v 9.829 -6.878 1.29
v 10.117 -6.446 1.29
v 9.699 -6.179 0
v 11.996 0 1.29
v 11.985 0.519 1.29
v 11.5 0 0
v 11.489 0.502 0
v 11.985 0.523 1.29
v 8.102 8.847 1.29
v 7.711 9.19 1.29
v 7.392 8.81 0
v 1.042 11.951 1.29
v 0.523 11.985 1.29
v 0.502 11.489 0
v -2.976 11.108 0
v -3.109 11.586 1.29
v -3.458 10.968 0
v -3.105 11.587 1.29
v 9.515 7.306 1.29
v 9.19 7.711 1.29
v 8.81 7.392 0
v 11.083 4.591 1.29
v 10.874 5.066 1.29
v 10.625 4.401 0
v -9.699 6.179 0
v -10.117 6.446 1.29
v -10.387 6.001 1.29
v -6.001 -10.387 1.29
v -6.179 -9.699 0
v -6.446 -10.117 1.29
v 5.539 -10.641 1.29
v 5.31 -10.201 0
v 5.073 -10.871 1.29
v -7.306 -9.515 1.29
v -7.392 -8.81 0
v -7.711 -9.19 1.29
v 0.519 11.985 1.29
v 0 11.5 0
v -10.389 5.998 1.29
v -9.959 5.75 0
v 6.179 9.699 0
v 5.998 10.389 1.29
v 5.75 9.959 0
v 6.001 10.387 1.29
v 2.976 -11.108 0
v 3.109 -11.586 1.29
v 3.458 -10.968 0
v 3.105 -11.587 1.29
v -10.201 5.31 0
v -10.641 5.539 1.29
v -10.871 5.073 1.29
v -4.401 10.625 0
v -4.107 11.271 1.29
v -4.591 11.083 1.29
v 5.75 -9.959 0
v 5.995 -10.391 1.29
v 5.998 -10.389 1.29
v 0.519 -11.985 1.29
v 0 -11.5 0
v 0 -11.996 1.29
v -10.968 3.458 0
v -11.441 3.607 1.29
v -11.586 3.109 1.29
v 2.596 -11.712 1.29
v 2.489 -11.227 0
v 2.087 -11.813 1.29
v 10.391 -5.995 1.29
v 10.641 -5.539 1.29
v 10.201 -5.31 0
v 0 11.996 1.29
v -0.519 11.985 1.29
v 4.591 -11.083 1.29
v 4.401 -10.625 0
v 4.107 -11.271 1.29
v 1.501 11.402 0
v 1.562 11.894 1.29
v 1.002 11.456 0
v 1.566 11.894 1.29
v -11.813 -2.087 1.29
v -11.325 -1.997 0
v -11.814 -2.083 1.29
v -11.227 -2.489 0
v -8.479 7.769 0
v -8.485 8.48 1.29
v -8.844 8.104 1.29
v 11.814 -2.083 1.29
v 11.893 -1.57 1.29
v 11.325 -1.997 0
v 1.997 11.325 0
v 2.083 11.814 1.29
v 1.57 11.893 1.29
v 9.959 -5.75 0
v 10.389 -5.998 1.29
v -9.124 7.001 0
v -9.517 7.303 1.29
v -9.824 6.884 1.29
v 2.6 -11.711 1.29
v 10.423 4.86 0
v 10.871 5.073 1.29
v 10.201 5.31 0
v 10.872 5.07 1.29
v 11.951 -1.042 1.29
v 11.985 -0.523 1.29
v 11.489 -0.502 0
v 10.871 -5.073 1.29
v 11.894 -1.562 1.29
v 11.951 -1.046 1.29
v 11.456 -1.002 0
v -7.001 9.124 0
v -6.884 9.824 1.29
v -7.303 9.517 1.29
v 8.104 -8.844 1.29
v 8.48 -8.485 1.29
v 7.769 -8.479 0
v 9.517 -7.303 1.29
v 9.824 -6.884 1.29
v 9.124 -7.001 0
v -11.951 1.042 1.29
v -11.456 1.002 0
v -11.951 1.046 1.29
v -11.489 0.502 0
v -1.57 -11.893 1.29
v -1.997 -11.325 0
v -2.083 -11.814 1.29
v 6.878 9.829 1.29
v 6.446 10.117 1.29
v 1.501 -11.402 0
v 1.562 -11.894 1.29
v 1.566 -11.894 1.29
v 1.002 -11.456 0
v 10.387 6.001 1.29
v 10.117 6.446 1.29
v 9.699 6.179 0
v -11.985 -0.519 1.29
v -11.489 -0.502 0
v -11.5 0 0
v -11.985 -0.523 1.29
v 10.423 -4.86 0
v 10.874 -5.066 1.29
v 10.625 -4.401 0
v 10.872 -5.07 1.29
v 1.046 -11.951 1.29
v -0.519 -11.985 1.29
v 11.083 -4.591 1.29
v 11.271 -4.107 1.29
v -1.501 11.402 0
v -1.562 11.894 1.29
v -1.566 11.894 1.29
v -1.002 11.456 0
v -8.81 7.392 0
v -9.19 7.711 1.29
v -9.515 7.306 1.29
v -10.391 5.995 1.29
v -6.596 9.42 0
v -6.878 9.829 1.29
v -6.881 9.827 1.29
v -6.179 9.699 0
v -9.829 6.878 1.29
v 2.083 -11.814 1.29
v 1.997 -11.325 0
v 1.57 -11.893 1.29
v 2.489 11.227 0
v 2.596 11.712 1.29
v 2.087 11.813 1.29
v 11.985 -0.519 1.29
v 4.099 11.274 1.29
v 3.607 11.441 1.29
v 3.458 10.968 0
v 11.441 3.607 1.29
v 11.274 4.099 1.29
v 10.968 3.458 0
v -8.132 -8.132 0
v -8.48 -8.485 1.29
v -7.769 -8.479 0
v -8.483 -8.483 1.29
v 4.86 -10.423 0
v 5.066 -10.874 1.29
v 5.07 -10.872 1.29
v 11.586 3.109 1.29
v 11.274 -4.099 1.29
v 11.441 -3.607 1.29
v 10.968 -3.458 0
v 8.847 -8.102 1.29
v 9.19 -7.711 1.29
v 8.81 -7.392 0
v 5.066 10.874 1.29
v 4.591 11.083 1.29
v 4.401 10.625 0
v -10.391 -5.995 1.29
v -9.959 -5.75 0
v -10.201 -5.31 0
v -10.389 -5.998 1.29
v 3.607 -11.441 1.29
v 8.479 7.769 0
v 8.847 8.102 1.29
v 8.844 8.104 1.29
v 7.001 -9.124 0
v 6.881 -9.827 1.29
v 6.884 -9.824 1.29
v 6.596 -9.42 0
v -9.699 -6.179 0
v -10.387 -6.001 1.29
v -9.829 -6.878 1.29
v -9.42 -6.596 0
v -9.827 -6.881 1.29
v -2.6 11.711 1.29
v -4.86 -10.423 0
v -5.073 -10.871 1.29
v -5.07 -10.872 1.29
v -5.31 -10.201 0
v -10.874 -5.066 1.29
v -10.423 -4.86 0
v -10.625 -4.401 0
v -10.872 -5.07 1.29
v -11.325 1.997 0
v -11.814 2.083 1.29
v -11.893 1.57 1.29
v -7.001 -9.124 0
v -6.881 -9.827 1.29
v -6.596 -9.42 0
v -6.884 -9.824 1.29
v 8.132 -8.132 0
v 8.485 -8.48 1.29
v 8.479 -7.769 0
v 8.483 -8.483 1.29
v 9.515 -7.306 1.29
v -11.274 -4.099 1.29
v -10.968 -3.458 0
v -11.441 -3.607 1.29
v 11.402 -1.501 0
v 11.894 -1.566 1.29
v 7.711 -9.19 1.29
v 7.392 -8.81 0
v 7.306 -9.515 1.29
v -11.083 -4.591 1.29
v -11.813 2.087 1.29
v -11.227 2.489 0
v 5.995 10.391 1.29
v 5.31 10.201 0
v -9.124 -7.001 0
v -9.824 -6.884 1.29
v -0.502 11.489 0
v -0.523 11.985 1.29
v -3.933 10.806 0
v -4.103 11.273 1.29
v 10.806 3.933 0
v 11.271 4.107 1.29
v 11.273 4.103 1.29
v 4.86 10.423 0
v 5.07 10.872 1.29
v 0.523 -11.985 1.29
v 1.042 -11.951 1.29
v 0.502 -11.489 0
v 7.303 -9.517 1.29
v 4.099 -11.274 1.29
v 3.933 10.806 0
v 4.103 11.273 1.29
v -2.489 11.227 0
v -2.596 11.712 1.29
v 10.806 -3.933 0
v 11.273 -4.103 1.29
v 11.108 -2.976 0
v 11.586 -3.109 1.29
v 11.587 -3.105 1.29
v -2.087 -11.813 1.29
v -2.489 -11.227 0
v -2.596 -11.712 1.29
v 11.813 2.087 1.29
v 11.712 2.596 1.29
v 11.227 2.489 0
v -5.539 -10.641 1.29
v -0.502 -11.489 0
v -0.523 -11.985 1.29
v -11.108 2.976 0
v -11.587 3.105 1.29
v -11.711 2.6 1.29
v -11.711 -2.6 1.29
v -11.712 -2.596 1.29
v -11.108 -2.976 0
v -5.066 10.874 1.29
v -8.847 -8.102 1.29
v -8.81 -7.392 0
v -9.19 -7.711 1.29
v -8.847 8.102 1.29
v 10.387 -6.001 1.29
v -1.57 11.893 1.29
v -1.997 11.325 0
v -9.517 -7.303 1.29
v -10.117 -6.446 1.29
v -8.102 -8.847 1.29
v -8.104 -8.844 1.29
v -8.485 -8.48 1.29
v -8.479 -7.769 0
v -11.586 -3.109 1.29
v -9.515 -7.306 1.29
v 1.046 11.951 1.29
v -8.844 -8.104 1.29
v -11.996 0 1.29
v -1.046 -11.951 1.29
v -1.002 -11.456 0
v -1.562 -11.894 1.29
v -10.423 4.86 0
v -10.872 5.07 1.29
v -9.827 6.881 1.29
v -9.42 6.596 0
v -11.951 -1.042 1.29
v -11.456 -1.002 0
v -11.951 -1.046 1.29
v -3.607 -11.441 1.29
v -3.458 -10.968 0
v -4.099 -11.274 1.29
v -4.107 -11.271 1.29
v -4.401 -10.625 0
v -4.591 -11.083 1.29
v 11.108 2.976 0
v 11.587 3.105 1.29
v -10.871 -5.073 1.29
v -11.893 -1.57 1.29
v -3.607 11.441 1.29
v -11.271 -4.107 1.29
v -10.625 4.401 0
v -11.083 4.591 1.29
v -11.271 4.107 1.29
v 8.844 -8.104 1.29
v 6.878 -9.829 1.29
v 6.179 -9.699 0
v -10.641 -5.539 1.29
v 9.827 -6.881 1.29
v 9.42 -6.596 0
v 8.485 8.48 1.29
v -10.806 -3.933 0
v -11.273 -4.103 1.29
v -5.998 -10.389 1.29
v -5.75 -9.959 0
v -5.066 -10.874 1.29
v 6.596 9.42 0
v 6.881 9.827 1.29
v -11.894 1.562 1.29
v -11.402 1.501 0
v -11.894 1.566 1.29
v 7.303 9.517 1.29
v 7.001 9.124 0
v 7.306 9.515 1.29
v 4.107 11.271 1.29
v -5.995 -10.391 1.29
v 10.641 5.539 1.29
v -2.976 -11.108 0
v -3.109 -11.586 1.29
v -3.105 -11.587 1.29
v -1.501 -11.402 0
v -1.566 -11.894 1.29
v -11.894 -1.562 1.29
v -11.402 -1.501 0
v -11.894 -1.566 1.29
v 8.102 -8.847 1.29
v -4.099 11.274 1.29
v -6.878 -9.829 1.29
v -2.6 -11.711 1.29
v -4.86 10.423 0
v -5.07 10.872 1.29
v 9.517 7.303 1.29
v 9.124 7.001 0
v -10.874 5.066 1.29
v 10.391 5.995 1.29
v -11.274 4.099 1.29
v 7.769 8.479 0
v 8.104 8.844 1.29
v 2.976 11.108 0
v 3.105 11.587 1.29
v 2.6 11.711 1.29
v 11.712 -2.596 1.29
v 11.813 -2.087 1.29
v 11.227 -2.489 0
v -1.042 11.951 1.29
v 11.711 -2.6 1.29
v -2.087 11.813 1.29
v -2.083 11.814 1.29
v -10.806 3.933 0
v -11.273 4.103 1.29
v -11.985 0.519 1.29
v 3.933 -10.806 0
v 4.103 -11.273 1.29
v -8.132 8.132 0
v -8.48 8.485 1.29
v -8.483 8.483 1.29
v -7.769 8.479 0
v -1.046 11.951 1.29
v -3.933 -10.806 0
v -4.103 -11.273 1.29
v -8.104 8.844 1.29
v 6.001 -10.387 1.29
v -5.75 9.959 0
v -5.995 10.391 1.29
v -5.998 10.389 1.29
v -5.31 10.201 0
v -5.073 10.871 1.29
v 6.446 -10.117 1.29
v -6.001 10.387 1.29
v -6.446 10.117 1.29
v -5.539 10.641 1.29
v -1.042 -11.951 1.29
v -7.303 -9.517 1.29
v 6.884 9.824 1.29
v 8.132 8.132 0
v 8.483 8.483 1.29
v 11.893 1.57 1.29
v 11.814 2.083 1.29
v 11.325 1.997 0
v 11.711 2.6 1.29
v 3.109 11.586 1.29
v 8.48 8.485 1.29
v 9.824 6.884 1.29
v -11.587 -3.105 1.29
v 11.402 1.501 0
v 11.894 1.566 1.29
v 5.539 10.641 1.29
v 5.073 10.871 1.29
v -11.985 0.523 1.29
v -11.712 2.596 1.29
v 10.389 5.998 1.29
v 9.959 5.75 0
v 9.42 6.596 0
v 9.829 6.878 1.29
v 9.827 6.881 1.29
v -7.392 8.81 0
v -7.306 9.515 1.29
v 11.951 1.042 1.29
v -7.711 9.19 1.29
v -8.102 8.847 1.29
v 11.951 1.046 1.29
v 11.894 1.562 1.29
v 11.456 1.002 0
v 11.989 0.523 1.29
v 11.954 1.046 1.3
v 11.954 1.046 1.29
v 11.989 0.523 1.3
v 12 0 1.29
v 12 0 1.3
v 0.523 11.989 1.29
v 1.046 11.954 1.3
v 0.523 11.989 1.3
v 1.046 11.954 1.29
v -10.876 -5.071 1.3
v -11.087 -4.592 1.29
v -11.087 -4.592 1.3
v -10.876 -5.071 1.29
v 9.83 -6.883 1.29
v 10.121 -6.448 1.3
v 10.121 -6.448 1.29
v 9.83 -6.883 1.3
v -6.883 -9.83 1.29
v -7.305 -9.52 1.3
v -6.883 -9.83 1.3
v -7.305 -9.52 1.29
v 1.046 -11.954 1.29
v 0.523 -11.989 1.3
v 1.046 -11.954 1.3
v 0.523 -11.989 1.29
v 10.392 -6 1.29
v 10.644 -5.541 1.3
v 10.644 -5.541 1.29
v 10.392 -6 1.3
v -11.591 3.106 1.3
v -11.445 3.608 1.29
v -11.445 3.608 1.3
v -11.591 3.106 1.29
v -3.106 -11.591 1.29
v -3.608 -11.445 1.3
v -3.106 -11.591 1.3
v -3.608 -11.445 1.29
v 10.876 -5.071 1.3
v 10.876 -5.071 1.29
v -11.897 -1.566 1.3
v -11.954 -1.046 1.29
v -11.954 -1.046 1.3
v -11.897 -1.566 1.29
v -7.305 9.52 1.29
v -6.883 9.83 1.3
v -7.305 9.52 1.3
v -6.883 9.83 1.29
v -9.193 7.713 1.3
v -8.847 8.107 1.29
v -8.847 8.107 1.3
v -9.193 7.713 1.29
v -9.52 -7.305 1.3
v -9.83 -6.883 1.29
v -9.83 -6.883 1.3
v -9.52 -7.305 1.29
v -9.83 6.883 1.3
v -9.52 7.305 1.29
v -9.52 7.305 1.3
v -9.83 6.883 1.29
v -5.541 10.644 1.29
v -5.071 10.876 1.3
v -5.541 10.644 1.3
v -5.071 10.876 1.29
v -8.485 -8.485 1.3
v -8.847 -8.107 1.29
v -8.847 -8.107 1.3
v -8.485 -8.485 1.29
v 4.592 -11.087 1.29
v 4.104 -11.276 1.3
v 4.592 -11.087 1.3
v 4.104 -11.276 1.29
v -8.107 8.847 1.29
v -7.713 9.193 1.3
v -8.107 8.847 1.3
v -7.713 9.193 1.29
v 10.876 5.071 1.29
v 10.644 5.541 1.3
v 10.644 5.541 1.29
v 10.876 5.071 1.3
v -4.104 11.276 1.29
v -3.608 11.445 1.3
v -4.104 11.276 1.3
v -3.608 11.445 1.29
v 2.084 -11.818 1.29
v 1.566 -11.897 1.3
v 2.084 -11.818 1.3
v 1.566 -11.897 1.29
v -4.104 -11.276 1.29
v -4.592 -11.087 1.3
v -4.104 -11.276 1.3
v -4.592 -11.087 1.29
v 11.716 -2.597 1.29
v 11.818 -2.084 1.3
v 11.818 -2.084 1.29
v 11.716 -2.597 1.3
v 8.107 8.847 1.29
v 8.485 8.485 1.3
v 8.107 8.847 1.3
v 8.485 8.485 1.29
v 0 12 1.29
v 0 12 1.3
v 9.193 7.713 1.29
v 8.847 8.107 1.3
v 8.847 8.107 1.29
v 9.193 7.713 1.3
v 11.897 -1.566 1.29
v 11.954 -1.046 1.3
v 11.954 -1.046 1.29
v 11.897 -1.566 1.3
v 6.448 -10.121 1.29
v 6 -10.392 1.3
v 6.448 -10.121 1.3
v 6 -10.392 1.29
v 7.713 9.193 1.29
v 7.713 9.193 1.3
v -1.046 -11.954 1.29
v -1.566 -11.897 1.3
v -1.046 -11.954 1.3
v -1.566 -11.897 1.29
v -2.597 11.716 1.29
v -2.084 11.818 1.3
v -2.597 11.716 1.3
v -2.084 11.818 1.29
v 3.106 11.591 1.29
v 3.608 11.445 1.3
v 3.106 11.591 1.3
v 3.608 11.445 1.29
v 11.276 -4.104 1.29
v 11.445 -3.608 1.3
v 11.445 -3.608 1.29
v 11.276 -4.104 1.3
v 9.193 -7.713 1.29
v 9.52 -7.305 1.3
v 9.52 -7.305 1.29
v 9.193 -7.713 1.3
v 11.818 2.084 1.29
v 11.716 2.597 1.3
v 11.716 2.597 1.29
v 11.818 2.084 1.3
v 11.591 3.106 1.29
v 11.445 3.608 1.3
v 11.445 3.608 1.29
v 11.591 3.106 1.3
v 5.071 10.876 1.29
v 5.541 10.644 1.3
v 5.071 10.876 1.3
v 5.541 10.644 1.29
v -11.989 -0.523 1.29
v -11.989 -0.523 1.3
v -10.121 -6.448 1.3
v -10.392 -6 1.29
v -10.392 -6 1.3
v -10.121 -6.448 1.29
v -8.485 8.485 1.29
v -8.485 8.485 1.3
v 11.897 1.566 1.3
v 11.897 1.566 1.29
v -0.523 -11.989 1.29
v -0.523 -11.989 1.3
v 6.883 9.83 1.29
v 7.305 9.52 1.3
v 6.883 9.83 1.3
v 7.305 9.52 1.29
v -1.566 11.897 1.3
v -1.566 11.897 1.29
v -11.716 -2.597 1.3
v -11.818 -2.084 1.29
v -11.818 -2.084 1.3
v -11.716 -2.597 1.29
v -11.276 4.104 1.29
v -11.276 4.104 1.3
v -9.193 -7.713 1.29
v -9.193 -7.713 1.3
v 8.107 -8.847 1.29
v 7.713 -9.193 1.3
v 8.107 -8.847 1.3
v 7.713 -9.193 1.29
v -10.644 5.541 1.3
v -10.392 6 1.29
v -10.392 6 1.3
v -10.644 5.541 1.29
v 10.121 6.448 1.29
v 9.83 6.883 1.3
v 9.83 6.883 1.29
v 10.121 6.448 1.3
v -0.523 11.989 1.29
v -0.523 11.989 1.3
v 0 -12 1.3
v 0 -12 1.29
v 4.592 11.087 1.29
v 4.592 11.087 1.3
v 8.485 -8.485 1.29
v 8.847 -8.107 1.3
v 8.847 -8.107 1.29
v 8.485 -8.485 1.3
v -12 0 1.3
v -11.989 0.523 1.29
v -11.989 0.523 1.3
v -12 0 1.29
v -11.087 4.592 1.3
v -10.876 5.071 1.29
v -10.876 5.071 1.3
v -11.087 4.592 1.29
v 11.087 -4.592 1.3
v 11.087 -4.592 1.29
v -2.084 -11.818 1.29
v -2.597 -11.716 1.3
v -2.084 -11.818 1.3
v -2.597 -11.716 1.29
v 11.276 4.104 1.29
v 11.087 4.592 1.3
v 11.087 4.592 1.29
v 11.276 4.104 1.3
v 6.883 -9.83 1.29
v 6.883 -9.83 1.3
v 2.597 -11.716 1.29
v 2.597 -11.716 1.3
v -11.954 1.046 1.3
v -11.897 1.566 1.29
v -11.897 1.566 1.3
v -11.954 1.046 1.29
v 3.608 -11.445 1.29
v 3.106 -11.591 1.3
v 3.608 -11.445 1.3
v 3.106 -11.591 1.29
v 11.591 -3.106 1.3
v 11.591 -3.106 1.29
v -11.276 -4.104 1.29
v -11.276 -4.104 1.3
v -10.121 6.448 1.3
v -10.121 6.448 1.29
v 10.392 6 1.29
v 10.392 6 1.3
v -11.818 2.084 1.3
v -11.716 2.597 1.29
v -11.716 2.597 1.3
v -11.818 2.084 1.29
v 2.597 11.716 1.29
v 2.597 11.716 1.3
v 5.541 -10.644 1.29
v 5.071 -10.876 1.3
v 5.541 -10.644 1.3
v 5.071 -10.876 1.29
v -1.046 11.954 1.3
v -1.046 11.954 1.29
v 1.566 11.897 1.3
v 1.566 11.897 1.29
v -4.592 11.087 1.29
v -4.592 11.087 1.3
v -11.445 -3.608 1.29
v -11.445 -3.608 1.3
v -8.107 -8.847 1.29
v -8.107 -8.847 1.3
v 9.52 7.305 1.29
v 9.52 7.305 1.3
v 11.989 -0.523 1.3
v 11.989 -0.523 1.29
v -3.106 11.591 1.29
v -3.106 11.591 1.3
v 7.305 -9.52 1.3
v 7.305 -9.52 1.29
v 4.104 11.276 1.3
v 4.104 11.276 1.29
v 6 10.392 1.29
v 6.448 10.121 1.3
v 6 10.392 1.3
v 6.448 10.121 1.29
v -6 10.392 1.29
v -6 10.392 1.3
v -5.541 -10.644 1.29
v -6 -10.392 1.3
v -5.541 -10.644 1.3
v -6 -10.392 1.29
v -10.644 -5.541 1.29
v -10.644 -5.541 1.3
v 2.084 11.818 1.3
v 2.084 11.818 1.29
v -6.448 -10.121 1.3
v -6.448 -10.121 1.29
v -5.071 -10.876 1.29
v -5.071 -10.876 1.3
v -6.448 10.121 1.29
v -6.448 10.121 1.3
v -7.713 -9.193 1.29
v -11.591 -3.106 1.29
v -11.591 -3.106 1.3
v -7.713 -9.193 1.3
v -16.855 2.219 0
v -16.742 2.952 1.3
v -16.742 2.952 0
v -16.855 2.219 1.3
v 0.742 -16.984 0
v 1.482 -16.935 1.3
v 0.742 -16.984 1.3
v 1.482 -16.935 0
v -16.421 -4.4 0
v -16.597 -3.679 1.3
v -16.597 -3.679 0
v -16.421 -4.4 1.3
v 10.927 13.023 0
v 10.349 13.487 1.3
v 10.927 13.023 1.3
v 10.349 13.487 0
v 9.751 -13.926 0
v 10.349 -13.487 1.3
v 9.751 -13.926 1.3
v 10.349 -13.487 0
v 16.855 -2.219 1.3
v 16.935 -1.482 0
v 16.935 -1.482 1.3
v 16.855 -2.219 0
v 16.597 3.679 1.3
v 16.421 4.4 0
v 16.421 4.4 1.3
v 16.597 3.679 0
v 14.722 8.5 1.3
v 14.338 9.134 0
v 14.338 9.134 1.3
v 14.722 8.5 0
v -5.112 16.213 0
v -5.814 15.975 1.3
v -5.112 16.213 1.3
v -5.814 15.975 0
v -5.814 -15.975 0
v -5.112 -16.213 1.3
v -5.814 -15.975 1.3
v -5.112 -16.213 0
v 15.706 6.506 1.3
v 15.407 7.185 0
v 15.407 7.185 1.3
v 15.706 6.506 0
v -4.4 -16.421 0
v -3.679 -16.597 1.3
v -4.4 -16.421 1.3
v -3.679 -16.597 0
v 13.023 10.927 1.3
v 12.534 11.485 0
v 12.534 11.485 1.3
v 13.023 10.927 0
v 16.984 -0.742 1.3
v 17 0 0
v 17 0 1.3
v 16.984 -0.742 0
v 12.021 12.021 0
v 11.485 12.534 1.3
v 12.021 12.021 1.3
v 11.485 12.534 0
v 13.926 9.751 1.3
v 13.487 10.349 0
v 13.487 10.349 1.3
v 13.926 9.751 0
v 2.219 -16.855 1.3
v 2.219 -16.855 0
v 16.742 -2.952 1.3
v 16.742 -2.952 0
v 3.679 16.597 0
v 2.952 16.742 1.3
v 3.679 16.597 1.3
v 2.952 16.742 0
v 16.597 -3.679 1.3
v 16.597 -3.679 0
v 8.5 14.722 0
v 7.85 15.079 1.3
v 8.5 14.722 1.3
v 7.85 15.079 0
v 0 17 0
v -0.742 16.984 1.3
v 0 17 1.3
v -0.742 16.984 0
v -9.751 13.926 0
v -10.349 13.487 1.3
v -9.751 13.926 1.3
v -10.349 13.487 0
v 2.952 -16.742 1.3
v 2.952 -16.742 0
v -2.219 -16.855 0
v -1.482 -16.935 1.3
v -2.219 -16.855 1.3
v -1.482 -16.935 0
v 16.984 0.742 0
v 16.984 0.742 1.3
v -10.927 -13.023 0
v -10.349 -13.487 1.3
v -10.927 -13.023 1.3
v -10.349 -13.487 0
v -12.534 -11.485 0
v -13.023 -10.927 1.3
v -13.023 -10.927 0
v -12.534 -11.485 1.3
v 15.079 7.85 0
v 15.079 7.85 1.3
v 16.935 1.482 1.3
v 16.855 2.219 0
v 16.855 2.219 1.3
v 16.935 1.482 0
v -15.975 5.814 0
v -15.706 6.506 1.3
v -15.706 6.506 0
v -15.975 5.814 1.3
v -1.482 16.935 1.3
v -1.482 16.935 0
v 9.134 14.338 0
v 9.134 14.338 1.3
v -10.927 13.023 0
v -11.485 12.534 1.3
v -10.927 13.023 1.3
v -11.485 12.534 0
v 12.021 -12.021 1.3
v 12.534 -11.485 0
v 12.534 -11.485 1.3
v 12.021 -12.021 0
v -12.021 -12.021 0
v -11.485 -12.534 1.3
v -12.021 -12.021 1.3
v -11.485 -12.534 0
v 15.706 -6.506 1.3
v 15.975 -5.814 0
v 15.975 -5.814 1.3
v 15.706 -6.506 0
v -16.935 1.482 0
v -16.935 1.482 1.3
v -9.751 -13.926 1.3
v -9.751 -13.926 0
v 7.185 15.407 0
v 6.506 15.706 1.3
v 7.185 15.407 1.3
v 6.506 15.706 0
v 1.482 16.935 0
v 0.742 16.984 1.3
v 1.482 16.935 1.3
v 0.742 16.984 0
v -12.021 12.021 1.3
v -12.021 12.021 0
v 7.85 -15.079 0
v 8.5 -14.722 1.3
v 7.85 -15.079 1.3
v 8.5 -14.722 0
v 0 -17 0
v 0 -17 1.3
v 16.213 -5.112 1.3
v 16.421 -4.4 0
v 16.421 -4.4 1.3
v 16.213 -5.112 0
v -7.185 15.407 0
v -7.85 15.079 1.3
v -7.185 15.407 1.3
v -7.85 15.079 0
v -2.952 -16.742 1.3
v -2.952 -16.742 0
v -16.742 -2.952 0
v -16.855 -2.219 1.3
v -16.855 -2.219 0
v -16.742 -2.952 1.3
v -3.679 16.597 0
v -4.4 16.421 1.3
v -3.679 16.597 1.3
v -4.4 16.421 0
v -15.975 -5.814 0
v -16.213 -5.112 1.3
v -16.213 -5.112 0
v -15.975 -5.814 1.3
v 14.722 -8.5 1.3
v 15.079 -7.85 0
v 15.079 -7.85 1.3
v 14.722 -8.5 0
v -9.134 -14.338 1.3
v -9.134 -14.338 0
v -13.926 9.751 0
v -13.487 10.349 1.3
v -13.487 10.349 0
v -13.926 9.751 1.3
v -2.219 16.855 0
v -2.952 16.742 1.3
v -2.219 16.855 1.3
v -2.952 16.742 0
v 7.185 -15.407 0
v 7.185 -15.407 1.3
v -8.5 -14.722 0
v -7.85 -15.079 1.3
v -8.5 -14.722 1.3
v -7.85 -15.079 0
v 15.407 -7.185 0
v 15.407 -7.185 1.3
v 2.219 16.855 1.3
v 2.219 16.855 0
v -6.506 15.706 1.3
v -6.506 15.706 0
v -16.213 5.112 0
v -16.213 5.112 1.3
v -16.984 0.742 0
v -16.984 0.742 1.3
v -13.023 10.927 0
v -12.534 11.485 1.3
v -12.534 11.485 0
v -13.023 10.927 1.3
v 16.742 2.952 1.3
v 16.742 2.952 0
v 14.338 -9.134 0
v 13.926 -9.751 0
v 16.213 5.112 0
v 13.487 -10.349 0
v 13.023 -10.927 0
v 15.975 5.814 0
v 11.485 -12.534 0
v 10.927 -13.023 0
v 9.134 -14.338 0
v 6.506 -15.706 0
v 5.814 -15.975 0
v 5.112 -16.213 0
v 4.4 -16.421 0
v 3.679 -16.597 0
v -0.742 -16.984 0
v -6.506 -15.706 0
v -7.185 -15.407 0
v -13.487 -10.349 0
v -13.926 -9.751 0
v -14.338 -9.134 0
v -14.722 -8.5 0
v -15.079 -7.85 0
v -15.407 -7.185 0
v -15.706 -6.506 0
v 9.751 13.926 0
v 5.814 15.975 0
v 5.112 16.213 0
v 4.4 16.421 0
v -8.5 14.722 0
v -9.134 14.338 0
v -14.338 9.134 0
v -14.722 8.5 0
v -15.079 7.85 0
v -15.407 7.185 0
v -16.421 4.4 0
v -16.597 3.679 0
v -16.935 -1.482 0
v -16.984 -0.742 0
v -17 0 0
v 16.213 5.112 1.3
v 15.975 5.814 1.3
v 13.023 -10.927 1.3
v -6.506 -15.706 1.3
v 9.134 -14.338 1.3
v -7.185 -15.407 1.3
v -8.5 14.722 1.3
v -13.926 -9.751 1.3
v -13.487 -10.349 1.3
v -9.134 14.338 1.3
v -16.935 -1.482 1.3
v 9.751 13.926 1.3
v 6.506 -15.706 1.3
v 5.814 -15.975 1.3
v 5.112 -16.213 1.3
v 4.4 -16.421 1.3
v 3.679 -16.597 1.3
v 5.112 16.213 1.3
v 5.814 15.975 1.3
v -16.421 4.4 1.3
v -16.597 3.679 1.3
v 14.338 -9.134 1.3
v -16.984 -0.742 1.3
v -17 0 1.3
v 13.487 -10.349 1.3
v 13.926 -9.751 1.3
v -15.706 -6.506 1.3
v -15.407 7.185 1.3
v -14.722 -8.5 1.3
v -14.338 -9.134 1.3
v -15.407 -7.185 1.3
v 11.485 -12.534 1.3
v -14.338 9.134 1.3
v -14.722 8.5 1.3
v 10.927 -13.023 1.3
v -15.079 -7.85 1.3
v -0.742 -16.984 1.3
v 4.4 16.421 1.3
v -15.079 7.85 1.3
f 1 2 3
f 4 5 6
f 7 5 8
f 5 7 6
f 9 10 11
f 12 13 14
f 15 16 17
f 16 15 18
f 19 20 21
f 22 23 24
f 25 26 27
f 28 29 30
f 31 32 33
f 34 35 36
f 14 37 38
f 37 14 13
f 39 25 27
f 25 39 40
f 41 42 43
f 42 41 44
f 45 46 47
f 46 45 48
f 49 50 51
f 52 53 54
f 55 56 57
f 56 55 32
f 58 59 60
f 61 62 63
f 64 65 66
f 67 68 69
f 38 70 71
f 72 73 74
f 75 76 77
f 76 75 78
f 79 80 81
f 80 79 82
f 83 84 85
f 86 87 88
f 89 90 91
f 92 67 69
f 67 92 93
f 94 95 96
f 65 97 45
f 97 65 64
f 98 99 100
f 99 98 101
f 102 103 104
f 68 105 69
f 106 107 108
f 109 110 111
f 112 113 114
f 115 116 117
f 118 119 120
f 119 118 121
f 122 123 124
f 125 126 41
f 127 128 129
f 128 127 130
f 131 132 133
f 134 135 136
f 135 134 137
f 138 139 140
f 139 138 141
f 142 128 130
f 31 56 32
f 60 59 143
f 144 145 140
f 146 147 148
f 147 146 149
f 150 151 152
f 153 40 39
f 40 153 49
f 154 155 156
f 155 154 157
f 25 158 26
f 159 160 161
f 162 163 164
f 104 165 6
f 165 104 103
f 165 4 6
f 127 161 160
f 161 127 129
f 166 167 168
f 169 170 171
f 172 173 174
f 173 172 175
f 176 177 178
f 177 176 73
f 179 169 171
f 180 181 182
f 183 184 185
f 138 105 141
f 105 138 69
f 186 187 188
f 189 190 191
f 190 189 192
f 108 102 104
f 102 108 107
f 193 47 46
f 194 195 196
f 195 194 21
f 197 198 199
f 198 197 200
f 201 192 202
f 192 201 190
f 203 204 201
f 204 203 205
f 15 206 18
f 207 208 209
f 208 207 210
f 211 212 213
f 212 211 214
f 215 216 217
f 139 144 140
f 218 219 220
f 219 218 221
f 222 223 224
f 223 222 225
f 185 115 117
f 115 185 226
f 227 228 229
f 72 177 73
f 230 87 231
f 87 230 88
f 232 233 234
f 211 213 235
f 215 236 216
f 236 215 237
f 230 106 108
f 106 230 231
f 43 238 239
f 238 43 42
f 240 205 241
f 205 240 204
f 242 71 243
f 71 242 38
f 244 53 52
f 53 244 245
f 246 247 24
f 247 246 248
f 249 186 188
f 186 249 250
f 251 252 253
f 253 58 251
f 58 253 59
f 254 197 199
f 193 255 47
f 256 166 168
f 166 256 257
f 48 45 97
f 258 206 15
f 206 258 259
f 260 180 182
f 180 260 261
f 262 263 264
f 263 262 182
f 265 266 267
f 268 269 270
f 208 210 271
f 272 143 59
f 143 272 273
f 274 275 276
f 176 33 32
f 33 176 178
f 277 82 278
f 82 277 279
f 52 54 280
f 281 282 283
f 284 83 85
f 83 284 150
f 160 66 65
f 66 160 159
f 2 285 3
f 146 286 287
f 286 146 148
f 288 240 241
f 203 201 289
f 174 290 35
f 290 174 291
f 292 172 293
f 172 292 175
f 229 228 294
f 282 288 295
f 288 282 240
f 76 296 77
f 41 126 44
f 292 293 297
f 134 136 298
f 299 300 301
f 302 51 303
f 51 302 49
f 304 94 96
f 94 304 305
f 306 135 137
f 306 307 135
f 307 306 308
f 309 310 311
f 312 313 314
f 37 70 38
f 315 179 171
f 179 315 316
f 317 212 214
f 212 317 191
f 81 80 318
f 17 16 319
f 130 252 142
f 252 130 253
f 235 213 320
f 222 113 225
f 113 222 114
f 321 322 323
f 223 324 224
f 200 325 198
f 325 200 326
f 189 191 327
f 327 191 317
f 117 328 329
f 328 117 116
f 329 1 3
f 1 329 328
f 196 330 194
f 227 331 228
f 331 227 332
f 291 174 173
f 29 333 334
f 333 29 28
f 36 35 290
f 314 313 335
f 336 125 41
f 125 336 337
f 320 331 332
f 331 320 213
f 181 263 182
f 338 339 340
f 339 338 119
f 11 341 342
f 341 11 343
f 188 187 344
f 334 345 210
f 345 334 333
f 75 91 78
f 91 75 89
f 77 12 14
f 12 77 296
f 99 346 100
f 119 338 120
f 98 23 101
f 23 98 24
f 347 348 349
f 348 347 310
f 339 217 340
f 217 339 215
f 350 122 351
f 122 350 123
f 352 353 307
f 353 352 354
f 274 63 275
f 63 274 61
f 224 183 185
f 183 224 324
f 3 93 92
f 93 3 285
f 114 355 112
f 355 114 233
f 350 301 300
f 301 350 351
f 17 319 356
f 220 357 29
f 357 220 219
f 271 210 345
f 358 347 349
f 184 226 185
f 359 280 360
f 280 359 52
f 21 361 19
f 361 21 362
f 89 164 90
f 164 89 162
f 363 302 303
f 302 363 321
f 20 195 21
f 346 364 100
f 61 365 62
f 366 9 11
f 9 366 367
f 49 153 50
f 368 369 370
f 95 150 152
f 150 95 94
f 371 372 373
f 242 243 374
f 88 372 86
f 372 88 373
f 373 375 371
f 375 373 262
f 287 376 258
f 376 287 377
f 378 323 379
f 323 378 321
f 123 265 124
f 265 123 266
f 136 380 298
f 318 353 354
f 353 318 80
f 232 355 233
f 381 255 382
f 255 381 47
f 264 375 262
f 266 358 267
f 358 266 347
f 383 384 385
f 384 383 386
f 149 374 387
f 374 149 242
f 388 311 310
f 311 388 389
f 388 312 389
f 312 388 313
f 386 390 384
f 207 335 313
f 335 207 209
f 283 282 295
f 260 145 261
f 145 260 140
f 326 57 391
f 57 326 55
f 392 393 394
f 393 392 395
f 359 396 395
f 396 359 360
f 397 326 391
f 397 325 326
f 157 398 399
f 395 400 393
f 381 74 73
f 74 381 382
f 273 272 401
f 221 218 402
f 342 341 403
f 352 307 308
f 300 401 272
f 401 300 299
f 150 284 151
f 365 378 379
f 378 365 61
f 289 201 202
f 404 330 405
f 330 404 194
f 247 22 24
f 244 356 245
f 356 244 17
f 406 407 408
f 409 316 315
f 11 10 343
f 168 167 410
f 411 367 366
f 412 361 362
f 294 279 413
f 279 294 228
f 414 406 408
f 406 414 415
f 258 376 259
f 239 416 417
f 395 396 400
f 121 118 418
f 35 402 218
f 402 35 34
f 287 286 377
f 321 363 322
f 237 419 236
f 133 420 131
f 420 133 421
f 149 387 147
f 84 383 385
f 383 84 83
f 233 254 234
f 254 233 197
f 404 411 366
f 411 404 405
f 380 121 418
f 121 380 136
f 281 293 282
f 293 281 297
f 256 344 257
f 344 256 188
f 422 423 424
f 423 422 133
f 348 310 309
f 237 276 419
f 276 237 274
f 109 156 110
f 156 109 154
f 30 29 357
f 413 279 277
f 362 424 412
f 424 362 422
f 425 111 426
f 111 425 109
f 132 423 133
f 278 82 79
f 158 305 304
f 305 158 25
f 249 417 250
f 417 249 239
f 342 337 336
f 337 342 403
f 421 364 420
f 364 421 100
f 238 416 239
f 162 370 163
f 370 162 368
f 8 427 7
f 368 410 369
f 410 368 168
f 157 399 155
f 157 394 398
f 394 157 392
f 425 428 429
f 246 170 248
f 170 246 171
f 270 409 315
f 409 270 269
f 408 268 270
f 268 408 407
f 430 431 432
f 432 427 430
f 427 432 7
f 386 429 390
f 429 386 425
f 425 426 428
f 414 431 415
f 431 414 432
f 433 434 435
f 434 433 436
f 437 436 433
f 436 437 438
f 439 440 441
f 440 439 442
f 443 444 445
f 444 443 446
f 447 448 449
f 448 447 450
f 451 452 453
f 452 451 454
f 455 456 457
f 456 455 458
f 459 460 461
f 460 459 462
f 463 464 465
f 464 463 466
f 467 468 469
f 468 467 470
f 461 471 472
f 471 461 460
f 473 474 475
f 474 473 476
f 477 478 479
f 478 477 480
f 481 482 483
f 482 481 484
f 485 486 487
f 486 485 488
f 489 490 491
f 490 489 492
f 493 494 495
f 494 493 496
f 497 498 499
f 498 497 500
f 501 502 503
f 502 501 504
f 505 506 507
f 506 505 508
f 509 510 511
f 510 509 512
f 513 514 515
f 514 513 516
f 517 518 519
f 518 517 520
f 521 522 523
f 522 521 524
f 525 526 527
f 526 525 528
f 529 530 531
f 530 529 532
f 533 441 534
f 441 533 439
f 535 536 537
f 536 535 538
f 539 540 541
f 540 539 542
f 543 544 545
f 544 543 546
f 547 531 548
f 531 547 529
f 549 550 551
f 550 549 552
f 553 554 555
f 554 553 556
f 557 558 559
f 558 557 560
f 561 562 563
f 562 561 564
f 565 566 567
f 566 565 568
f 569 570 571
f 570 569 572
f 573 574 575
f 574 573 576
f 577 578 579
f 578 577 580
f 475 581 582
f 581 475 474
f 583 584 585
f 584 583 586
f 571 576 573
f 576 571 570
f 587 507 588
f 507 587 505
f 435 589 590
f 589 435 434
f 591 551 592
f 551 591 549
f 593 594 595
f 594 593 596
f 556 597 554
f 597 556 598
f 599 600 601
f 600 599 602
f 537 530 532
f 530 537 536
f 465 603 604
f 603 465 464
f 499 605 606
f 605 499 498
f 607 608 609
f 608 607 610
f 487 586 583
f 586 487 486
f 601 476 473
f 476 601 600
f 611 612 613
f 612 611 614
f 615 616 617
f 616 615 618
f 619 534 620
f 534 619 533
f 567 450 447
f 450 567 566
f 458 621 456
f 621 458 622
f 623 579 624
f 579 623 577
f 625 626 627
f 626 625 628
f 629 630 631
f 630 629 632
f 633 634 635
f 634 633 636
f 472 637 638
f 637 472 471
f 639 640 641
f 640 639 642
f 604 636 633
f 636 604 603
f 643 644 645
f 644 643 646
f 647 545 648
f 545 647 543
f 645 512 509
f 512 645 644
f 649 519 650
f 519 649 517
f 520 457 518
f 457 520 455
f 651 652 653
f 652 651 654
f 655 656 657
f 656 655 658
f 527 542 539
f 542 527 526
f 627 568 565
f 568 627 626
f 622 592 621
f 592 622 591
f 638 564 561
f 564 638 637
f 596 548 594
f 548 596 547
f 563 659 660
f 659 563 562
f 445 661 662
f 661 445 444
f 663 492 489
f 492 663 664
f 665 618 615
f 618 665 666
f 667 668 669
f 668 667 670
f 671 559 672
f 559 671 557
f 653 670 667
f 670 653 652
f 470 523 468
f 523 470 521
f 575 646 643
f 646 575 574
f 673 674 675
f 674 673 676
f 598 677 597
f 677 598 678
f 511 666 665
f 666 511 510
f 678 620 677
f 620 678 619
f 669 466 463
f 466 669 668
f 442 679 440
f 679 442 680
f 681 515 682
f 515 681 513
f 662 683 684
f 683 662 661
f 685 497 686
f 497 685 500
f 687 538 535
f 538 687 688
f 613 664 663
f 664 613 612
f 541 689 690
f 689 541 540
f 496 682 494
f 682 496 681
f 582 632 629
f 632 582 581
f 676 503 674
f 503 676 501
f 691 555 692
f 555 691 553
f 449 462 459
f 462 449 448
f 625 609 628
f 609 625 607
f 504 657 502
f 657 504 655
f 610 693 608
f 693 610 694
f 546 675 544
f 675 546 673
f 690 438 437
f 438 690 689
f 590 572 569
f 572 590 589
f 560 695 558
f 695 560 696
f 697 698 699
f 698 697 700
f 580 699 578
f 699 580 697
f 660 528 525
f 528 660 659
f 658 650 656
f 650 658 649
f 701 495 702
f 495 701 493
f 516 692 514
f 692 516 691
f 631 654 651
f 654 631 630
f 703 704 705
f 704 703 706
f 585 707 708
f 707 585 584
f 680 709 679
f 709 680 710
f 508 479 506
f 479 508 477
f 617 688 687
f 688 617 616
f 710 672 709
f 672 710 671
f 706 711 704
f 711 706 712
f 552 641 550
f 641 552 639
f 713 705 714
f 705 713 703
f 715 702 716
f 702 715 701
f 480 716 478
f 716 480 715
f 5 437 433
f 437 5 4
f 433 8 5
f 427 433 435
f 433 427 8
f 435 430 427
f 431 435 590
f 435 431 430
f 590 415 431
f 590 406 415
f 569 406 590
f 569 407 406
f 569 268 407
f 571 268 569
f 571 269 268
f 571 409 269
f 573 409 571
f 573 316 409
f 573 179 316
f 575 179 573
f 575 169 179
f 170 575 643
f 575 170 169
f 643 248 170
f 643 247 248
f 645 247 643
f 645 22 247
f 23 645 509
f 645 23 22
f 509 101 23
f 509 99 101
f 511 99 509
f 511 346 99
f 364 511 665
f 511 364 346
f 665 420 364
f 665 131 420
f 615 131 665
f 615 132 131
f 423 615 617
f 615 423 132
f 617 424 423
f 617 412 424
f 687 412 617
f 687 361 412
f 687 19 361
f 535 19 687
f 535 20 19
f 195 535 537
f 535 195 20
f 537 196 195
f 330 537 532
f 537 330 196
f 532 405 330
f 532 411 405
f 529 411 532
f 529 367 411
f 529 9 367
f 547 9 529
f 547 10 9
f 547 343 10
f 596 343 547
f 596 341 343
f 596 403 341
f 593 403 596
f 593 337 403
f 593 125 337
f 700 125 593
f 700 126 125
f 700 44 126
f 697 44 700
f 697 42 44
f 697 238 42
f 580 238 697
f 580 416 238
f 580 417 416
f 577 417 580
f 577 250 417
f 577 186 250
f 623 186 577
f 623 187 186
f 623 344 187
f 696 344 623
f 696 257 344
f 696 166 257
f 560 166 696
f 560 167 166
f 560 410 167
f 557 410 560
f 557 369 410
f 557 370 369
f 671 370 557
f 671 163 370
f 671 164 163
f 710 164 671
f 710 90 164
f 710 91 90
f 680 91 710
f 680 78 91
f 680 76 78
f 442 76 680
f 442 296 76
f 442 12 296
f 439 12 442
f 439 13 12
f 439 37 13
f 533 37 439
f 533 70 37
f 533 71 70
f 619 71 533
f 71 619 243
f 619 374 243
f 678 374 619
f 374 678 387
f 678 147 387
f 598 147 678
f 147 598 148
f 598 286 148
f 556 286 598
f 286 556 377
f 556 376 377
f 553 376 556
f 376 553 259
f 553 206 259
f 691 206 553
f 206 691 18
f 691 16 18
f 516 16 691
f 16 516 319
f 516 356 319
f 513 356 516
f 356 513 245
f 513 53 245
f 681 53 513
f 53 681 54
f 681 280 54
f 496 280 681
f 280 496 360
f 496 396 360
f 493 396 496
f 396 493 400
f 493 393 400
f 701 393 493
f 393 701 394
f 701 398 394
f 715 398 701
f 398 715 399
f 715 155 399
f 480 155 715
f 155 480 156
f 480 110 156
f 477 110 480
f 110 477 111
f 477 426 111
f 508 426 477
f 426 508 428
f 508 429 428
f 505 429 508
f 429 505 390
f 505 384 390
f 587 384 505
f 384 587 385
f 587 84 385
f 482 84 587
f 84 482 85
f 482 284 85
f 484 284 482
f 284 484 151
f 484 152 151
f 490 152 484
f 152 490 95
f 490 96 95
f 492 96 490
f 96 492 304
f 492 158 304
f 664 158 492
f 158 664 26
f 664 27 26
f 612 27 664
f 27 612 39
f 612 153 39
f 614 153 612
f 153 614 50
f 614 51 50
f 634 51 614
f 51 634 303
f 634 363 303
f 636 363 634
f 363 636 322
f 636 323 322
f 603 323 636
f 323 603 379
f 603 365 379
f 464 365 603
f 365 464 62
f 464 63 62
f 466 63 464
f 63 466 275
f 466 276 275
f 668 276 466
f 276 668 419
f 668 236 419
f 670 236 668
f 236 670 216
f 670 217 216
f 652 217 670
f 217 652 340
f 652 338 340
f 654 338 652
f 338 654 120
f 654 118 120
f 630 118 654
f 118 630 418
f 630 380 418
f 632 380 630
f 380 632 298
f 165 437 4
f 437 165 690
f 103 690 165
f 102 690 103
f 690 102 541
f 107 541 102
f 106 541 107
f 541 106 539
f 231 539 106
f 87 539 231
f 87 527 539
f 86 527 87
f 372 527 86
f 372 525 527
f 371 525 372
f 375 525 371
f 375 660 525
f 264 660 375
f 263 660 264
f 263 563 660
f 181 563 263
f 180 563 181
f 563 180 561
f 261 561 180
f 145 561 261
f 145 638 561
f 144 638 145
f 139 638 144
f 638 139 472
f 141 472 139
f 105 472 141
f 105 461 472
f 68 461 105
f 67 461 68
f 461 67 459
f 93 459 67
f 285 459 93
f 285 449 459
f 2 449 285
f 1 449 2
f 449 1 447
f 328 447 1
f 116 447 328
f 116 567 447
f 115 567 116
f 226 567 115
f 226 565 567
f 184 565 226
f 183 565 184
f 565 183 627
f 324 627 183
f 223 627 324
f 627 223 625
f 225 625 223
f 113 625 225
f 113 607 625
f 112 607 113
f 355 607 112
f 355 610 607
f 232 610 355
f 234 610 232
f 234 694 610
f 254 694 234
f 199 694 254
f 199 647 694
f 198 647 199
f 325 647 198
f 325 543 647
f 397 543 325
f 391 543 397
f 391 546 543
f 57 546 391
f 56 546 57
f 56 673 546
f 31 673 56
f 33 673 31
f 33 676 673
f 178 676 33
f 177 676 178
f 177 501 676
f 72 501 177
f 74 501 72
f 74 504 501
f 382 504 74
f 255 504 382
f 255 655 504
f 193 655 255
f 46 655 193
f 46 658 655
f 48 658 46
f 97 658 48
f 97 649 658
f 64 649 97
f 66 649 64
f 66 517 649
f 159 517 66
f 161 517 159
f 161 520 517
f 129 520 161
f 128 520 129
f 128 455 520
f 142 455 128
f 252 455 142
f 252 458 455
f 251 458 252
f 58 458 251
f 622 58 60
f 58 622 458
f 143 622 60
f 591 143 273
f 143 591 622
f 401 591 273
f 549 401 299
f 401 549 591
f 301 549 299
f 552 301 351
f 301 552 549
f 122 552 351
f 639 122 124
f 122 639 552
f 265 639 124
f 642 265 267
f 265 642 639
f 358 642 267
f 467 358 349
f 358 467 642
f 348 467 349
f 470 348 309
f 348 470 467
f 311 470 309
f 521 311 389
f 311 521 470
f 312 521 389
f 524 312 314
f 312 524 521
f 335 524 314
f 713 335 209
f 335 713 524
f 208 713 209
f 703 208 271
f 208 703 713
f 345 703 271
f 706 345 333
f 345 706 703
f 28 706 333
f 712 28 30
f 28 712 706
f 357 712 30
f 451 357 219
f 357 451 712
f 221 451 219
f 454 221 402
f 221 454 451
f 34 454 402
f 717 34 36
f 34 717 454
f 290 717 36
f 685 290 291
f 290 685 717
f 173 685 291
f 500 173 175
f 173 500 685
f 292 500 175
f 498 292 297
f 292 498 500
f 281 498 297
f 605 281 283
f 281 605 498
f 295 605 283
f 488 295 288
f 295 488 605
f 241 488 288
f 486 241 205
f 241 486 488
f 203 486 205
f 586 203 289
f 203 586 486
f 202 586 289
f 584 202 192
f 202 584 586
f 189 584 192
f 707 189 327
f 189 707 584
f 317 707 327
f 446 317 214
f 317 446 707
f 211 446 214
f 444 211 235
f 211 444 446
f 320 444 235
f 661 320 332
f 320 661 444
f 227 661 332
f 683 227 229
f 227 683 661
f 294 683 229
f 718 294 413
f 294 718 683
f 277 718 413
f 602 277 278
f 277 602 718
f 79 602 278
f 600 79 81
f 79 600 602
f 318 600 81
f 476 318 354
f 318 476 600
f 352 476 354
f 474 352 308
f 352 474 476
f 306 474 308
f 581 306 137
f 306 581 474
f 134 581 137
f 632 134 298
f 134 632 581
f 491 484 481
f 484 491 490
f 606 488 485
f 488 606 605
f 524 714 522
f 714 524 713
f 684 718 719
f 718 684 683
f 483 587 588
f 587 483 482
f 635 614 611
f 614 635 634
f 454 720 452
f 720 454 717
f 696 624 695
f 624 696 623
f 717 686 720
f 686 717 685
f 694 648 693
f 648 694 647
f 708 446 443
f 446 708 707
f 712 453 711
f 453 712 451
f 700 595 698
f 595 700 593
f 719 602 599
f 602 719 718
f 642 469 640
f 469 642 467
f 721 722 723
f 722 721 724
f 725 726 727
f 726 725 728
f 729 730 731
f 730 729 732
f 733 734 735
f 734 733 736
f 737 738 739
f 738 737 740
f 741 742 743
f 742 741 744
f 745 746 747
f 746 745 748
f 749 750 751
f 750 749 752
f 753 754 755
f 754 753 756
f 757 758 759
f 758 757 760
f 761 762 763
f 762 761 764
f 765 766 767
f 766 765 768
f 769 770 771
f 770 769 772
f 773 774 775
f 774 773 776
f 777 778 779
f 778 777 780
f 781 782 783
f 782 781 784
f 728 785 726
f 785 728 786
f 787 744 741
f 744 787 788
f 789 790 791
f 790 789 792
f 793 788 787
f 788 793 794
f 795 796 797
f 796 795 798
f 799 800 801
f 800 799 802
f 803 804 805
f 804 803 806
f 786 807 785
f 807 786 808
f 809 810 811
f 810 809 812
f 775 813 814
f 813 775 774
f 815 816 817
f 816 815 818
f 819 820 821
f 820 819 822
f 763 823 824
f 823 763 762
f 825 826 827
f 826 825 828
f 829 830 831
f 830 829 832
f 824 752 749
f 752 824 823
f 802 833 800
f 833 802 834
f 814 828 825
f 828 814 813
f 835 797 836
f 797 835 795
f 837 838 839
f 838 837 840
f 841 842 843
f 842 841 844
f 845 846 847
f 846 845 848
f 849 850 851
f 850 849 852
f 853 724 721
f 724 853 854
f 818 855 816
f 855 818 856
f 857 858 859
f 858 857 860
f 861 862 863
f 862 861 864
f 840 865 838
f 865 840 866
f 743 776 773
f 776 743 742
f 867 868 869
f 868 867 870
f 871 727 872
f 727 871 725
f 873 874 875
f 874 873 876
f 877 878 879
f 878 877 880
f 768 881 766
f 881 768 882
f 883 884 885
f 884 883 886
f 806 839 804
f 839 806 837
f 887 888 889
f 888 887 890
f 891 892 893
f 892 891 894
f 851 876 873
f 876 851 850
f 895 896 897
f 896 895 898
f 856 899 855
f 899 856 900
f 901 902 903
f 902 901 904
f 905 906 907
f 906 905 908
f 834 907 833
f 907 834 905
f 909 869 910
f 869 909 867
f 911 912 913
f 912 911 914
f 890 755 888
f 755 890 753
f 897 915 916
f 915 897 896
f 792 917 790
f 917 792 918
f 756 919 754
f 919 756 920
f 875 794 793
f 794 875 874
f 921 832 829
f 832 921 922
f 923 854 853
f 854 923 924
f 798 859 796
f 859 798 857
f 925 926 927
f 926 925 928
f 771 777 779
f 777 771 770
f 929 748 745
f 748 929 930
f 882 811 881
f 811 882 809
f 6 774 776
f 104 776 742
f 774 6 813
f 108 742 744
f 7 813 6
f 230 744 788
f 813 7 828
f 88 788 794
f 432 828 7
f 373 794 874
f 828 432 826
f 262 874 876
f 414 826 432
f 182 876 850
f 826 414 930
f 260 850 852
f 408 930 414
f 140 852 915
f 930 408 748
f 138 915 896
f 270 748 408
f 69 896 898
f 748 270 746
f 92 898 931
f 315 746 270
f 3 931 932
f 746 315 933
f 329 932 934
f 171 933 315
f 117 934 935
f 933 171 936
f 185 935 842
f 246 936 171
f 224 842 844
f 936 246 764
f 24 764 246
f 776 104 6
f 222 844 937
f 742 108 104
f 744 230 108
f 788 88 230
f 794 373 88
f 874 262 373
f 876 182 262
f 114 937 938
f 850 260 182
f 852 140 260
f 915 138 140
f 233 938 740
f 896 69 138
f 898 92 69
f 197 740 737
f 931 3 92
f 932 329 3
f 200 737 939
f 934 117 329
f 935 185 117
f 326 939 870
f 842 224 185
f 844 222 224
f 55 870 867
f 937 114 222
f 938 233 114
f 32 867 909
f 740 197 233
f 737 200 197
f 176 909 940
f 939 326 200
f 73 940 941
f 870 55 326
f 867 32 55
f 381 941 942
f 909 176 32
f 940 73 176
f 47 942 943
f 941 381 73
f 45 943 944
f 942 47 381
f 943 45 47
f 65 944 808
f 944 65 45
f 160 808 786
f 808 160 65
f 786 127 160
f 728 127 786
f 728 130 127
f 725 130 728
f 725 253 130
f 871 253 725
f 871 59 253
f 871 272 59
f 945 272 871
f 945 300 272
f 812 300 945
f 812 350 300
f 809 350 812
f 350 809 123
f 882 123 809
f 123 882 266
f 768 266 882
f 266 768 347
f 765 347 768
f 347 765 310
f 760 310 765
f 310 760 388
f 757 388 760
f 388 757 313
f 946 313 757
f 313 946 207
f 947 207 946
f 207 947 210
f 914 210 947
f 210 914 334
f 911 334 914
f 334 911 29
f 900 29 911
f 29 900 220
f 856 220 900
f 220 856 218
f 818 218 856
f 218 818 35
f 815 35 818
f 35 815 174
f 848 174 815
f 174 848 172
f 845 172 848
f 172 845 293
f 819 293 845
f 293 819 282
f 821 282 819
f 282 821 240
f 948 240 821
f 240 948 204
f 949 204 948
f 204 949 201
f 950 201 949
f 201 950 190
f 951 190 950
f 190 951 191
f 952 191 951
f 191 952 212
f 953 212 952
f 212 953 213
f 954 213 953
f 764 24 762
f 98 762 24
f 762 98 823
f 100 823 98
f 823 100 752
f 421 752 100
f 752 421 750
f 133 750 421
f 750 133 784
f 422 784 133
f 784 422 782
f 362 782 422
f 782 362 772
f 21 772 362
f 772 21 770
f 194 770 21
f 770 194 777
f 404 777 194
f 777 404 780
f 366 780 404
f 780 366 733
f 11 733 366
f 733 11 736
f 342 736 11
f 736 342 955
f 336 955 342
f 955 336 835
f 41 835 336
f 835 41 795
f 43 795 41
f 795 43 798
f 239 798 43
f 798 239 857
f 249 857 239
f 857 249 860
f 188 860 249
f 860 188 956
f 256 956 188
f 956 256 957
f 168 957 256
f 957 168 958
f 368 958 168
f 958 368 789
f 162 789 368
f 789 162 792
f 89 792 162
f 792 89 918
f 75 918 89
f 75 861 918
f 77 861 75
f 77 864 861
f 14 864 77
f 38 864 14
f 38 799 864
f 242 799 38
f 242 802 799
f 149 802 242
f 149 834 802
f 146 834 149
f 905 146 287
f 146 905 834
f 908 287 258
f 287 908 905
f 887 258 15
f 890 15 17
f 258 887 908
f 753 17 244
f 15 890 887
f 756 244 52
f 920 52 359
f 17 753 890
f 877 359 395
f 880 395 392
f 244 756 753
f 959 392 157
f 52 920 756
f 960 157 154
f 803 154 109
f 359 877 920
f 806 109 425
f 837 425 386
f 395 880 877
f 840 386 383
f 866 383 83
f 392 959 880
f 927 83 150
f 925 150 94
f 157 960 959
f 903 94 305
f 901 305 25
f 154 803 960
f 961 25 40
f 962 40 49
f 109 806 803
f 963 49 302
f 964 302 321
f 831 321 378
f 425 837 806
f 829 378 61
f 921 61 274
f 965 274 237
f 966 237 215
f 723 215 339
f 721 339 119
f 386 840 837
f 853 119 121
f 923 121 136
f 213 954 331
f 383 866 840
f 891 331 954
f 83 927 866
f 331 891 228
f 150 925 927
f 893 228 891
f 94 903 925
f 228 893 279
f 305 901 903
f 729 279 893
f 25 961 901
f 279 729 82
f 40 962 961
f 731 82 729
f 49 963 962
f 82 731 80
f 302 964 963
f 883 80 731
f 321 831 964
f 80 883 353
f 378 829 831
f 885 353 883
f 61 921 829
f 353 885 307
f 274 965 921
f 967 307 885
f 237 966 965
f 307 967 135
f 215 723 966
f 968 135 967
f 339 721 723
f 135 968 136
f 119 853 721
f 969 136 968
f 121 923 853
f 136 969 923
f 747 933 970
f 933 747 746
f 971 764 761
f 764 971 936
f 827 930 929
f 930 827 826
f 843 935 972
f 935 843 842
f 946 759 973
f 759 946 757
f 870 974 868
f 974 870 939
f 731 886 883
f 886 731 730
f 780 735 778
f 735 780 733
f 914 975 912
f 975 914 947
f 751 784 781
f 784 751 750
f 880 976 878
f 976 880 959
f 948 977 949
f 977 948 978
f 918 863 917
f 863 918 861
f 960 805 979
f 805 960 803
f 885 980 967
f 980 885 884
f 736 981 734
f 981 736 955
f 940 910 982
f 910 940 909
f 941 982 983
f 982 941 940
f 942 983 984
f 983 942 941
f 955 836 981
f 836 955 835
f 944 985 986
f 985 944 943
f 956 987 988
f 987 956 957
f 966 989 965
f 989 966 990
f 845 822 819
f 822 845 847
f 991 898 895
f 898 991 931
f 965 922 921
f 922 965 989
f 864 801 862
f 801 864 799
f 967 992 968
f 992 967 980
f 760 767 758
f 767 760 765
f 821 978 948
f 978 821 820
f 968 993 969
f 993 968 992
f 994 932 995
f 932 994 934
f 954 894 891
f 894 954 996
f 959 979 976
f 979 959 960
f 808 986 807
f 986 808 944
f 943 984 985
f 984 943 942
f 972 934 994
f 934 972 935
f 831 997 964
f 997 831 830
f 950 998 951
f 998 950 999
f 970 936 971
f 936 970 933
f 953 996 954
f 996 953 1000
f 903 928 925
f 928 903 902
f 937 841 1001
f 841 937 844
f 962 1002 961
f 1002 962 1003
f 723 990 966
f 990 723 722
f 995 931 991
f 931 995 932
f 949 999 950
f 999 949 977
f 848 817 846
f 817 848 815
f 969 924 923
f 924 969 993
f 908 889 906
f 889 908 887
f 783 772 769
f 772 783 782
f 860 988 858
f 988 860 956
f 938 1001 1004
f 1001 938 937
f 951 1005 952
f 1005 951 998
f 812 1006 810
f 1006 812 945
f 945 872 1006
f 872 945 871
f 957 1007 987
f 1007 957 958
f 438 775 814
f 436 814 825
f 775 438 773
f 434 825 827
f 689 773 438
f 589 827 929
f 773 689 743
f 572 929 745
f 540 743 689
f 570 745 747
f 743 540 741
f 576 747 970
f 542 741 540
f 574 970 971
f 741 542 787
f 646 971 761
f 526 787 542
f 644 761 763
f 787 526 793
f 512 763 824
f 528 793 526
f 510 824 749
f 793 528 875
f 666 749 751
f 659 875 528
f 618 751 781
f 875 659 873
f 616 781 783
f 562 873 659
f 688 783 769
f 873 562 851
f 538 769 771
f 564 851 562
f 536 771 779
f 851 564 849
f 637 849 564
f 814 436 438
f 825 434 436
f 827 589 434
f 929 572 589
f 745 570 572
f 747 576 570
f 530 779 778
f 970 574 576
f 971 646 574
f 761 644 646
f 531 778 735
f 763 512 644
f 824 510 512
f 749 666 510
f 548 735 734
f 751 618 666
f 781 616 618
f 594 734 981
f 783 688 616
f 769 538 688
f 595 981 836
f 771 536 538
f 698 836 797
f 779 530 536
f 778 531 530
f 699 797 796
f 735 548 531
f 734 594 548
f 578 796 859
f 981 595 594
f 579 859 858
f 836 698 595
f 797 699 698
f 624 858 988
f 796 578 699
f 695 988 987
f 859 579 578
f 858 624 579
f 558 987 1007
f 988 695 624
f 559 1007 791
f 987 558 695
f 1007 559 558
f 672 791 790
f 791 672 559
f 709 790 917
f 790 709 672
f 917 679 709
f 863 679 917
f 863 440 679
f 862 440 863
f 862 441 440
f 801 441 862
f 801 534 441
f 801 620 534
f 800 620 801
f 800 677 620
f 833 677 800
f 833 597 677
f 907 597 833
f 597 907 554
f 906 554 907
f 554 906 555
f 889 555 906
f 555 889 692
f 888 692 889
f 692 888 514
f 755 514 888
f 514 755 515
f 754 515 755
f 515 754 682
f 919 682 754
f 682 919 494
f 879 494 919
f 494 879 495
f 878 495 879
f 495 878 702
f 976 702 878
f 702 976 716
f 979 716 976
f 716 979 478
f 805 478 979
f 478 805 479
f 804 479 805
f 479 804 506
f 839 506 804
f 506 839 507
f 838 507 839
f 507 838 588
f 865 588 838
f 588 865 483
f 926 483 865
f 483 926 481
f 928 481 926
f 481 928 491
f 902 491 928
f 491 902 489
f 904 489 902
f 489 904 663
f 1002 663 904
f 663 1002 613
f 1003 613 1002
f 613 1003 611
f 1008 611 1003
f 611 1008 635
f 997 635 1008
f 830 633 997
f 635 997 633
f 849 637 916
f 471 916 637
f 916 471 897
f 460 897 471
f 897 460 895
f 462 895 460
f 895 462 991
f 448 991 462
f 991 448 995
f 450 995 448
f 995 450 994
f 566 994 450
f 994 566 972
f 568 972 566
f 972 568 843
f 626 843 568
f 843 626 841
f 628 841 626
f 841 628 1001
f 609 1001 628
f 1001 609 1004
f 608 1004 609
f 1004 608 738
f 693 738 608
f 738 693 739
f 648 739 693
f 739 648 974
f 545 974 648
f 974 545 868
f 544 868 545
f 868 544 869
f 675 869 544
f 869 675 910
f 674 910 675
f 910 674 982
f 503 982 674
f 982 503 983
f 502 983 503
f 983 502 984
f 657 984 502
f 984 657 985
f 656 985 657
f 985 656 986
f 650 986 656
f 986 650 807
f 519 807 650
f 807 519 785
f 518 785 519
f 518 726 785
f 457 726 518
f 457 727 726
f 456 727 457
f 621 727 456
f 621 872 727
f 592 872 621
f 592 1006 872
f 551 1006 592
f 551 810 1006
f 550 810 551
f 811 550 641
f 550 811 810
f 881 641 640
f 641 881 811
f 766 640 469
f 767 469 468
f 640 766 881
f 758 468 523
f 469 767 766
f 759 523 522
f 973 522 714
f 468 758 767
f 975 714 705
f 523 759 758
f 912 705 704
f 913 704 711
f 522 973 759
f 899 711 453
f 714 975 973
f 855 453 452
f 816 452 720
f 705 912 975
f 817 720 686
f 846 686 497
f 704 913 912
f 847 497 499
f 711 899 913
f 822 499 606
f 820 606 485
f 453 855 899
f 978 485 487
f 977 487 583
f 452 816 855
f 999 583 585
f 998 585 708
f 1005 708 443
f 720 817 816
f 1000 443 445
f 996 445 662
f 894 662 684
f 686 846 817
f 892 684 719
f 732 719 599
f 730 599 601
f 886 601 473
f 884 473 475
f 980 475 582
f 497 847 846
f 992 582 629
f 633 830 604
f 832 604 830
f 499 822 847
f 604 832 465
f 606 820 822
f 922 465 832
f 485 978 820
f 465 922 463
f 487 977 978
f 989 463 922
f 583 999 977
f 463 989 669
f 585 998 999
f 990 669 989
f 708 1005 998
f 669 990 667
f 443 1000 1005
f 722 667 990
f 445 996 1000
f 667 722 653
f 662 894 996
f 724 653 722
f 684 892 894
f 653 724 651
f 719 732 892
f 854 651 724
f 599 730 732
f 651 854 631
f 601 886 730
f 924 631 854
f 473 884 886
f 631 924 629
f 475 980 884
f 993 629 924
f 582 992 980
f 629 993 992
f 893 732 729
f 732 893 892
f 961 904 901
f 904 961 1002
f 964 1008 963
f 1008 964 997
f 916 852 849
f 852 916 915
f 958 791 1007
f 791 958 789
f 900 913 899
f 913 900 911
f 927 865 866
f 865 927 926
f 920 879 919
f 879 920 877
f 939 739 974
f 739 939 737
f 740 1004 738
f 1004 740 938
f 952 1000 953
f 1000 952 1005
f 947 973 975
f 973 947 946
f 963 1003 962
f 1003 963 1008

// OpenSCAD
ringWidth = 5;
tolerance = 0.5;

module ring(diameter = 25, height = 1) {
    difference() {
        cylinder(h = height, r = diameter / 2 + ringWidth, $fn = 144);
        union() {
            cylinder(h = height, r1 = diameter / 2 - tolerance, r2 = diameter / 2, $fn = 144);
            translate([0, 0, -0.1]) cylinder(h = 1, r = diameter / 2 - tolerance, $fn = 144);
            translate([0, 0, height - 0.01]) cylinder(h = 1, r = diameter / 2, $fn = 144);
        };
    };
};

translate([0, 0, 0]) ring(diameter = 24, height = 1.3);
